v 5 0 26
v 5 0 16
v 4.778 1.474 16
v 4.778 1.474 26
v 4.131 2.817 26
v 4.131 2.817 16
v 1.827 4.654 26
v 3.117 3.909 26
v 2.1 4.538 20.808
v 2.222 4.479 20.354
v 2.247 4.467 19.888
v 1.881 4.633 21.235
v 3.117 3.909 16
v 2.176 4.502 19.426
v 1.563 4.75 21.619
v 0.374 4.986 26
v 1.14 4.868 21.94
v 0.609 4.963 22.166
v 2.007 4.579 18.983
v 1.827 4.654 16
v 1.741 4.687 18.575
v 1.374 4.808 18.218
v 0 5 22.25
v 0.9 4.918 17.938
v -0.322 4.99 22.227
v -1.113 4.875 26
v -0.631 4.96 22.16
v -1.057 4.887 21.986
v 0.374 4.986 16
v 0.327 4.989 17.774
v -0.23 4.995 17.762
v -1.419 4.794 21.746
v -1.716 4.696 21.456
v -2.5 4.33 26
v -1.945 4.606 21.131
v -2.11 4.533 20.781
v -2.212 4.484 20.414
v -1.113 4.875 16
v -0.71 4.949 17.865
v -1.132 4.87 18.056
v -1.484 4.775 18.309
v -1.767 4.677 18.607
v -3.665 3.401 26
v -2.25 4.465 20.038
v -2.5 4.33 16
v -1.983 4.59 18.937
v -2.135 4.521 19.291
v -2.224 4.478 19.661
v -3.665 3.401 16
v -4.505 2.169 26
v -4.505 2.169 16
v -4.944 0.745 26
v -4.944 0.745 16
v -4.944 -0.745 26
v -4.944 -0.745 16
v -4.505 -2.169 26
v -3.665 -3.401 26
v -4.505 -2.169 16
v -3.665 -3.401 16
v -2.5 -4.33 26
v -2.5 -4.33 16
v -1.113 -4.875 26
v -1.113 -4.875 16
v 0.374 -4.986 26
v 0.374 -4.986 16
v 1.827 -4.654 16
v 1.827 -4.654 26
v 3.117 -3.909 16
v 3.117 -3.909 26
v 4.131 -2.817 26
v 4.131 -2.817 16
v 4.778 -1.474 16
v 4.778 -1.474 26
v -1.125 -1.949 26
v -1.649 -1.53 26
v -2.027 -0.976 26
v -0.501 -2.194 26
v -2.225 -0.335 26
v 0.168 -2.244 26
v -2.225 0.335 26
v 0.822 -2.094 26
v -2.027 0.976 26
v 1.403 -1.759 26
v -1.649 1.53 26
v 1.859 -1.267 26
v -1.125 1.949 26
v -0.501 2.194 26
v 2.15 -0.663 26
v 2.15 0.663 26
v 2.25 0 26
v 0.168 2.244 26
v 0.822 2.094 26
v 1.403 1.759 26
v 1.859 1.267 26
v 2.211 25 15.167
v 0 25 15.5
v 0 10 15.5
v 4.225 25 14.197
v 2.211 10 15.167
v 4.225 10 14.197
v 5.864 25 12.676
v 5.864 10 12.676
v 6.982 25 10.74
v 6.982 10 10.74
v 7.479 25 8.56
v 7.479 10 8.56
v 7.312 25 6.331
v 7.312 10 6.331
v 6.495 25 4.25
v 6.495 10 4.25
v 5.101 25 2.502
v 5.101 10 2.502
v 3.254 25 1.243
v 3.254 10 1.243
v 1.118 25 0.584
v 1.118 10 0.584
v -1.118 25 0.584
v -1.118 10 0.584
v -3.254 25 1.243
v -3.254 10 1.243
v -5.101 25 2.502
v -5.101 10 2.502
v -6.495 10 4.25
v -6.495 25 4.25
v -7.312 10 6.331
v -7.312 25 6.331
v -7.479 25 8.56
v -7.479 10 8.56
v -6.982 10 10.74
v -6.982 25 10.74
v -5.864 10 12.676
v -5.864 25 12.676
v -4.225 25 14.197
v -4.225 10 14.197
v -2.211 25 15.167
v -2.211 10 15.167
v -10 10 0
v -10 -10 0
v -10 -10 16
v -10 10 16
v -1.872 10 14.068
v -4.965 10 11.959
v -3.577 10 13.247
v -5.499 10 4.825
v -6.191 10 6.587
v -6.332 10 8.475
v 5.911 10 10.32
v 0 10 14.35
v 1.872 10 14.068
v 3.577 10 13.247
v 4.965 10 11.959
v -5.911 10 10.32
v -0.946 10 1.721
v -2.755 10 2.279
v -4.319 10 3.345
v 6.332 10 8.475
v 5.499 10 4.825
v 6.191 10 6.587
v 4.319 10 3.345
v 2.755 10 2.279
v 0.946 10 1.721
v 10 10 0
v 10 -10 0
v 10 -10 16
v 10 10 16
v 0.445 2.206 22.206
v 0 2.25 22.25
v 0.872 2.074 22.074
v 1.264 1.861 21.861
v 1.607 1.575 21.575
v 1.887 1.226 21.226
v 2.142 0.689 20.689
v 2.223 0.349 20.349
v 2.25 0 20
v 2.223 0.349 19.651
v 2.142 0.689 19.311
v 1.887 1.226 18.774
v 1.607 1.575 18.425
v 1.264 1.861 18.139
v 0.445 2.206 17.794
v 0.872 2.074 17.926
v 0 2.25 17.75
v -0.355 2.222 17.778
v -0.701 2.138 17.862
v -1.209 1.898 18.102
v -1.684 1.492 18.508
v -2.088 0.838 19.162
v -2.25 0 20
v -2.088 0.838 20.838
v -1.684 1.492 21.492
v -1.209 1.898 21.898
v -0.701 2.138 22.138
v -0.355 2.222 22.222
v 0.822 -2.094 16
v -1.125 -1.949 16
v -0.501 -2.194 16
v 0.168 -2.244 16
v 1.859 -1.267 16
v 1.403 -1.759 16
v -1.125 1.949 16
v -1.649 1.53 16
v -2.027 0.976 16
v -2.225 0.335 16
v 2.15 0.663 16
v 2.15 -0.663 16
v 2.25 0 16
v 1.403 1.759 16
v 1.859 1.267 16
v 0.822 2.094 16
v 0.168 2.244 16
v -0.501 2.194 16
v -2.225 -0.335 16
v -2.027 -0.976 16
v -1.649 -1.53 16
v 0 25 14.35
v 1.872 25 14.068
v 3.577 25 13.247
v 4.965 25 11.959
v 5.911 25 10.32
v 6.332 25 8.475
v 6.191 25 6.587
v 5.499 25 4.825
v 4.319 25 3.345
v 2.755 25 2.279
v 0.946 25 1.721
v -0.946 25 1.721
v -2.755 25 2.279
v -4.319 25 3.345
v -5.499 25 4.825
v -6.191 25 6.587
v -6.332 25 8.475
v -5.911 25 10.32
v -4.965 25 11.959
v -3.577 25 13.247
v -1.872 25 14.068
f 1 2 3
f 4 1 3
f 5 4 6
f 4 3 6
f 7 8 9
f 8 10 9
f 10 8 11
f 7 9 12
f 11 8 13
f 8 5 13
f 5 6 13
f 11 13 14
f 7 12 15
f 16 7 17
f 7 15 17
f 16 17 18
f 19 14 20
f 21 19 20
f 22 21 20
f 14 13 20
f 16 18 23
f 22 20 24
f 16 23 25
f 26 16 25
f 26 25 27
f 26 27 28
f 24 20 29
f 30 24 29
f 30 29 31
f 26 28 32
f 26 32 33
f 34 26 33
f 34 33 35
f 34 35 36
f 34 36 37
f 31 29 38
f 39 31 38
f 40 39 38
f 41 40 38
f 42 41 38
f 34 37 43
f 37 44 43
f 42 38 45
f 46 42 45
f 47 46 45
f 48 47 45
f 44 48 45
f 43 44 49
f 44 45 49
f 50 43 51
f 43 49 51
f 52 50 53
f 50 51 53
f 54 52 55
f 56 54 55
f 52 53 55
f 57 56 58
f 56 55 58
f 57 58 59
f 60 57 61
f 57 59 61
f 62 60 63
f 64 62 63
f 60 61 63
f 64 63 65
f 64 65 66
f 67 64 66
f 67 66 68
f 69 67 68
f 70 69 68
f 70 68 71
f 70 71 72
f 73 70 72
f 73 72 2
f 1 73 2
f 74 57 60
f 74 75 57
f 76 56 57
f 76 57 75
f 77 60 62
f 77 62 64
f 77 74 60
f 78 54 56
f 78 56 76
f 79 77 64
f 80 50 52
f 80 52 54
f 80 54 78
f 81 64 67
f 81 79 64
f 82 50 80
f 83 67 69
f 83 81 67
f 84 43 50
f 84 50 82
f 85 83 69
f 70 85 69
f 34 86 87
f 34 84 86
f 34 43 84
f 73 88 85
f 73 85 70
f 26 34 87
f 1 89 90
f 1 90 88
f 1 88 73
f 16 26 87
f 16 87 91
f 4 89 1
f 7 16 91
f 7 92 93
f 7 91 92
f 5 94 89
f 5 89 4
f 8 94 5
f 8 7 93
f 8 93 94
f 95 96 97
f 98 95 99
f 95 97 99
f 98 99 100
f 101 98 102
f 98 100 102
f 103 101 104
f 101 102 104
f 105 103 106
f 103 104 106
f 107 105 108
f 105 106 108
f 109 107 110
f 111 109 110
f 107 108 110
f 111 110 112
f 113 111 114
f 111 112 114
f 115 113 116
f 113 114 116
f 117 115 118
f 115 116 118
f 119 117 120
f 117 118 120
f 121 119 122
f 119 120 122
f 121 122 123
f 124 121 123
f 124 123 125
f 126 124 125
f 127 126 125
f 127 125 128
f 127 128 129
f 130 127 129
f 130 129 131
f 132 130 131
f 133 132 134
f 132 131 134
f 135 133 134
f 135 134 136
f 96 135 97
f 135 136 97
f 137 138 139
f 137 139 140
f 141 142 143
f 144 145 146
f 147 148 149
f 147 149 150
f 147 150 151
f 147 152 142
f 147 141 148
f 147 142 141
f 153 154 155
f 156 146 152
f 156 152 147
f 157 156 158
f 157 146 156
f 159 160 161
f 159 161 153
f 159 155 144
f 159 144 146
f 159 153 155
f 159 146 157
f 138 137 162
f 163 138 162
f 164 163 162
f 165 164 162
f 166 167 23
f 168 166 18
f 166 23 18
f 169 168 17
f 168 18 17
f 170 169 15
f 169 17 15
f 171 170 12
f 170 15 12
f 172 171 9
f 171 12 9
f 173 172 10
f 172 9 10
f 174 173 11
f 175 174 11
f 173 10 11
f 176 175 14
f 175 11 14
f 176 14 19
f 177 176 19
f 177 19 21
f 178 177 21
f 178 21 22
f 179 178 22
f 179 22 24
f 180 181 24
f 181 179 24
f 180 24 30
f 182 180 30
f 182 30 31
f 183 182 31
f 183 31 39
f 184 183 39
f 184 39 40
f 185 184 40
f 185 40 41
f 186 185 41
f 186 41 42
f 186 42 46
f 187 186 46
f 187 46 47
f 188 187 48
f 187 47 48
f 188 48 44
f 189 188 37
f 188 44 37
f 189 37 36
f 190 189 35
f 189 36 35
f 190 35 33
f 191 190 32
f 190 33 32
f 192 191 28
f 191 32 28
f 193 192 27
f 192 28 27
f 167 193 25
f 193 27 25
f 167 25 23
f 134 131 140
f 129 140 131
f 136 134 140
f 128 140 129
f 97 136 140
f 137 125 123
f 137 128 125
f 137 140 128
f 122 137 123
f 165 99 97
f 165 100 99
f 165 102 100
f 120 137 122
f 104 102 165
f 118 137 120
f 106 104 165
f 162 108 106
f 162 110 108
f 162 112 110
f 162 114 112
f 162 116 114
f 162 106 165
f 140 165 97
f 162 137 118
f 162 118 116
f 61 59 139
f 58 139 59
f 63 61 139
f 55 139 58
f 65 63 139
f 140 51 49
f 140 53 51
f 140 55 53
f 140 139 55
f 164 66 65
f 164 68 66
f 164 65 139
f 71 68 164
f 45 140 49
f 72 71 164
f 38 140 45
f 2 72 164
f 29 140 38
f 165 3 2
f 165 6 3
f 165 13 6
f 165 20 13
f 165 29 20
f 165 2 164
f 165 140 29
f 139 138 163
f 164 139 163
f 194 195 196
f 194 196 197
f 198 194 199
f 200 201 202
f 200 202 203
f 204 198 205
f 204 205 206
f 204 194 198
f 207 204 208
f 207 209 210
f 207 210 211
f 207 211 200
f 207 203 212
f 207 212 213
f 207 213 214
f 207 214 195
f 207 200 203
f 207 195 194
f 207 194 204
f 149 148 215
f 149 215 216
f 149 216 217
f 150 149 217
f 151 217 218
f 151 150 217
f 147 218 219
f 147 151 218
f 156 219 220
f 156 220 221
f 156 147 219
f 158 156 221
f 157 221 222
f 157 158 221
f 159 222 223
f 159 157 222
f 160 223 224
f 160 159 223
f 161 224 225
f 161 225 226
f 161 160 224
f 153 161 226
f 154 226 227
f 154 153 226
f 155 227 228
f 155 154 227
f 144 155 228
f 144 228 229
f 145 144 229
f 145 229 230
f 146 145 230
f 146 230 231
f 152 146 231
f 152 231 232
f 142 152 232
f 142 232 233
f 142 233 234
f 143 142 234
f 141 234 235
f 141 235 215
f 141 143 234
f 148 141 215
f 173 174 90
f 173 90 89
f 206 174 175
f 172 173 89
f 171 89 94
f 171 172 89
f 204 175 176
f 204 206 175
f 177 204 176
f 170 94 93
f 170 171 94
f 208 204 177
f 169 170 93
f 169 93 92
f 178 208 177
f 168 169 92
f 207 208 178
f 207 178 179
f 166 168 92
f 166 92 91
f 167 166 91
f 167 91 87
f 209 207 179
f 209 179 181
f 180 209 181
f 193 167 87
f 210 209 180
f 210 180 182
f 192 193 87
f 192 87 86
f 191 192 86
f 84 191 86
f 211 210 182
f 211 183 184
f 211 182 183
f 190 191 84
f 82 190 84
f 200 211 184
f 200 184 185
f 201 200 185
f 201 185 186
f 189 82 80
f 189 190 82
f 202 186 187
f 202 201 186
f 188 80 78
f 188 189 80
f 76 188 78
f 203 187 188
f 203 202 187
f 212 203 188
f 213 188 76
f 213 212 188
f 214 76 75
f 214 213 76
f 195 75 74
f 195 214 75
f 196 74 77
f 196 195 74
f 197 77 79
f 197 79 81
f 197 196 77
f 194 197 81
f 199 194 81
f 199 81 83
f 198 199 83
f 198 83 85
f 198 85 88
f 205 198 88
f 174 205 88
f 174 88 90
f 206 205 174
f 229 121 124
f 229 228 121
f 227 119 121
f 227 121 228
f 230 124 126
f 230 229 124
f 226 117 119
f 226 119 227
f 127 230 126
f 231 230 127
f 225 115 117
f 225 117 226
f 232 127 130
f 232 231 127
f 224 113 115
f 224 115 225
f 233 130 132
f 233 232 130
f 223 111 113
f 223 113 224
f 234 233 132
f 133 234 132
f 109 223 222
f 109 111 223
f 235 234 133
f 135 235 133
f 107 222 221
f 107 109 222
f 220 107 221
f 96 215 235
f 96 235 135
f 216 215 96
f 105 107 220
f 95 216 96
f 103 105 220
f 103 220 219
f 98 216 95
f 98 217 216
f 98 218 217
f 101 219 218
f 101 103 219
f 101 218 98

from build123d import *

# Parameters (mm, degrees)
CROQUIS1_W              = 20
CROQUIS1_H              = 20
SALIENTE_EXTRUIR1_DEPTH = 16
CROQUIS2_R              = 5
CROQUIS2_R_2            = 2.25
SALIENTE_EXTRUIR2_DEPTH = 10
CROQUIS6_R              = 7.5
CROQUIS6_R_2            = 6.35
SALIENTE_EXTRUIR3_DEPTH = 15
CROQUIS7_R              = 2.25
CORTAR_EXTRUIR1_DEPTH   = 10


with BuildPart() as part:
    # Croquis1 → Saliente-Extruir1 (new body)
    with BuildSketch(Plane.XY):
        Rectangle(CROQUIS1_W, CROQUIS1_H)
    extrude(amount=SALIENTE_EXTRUIR1_DEPTH)

    # Croquis2 → Saliente-Extruir2 (add)
    with BuildSketch(Plane.XY.offset(16)):
        Circle(CROQUIS2_R)
        Circle(CROQUIS2_R_2, mode=Mode.SUBTRACT)
    extrude(amount=SALIENTE_EXTRUIR2_DEPTH)

    # Croquis6 → Saliente-Extruir3 (add)
    with BuildSketch(Plane(origin=(0, 10, 0), x_dir=(1, 0, 0), z_dir=(0, 1, 0))):
        with Locations(Location((0, -8, 0), (0, 0, 270))):
            Circle(CROQUIS6_R)
        with Locations(Location((0, -8, 0), (0, 0, 270))):
            Circle(CROQUIS6_R_2, mode=Mode.SUBTRACT)
    extrude(amount=SALIENTE_EXTRUIR3_DEPTH)

    # Croquis7 → Cortar-Extruir1 (cut)
    with BuildSketch(Plane(origin=(0, 10, 0), x_dir=(1, 0, 0), z_dir=(0, 1, 0))):
        with Locations(Location((0, -20, 0), (0, 0, 270))):
            Circle(CROQUIS7_R)
    extrude(amount=-CORTAR_EXTRUIR1_DEPTH, mode=Mode.SUBTRACT)


solid = part.part
